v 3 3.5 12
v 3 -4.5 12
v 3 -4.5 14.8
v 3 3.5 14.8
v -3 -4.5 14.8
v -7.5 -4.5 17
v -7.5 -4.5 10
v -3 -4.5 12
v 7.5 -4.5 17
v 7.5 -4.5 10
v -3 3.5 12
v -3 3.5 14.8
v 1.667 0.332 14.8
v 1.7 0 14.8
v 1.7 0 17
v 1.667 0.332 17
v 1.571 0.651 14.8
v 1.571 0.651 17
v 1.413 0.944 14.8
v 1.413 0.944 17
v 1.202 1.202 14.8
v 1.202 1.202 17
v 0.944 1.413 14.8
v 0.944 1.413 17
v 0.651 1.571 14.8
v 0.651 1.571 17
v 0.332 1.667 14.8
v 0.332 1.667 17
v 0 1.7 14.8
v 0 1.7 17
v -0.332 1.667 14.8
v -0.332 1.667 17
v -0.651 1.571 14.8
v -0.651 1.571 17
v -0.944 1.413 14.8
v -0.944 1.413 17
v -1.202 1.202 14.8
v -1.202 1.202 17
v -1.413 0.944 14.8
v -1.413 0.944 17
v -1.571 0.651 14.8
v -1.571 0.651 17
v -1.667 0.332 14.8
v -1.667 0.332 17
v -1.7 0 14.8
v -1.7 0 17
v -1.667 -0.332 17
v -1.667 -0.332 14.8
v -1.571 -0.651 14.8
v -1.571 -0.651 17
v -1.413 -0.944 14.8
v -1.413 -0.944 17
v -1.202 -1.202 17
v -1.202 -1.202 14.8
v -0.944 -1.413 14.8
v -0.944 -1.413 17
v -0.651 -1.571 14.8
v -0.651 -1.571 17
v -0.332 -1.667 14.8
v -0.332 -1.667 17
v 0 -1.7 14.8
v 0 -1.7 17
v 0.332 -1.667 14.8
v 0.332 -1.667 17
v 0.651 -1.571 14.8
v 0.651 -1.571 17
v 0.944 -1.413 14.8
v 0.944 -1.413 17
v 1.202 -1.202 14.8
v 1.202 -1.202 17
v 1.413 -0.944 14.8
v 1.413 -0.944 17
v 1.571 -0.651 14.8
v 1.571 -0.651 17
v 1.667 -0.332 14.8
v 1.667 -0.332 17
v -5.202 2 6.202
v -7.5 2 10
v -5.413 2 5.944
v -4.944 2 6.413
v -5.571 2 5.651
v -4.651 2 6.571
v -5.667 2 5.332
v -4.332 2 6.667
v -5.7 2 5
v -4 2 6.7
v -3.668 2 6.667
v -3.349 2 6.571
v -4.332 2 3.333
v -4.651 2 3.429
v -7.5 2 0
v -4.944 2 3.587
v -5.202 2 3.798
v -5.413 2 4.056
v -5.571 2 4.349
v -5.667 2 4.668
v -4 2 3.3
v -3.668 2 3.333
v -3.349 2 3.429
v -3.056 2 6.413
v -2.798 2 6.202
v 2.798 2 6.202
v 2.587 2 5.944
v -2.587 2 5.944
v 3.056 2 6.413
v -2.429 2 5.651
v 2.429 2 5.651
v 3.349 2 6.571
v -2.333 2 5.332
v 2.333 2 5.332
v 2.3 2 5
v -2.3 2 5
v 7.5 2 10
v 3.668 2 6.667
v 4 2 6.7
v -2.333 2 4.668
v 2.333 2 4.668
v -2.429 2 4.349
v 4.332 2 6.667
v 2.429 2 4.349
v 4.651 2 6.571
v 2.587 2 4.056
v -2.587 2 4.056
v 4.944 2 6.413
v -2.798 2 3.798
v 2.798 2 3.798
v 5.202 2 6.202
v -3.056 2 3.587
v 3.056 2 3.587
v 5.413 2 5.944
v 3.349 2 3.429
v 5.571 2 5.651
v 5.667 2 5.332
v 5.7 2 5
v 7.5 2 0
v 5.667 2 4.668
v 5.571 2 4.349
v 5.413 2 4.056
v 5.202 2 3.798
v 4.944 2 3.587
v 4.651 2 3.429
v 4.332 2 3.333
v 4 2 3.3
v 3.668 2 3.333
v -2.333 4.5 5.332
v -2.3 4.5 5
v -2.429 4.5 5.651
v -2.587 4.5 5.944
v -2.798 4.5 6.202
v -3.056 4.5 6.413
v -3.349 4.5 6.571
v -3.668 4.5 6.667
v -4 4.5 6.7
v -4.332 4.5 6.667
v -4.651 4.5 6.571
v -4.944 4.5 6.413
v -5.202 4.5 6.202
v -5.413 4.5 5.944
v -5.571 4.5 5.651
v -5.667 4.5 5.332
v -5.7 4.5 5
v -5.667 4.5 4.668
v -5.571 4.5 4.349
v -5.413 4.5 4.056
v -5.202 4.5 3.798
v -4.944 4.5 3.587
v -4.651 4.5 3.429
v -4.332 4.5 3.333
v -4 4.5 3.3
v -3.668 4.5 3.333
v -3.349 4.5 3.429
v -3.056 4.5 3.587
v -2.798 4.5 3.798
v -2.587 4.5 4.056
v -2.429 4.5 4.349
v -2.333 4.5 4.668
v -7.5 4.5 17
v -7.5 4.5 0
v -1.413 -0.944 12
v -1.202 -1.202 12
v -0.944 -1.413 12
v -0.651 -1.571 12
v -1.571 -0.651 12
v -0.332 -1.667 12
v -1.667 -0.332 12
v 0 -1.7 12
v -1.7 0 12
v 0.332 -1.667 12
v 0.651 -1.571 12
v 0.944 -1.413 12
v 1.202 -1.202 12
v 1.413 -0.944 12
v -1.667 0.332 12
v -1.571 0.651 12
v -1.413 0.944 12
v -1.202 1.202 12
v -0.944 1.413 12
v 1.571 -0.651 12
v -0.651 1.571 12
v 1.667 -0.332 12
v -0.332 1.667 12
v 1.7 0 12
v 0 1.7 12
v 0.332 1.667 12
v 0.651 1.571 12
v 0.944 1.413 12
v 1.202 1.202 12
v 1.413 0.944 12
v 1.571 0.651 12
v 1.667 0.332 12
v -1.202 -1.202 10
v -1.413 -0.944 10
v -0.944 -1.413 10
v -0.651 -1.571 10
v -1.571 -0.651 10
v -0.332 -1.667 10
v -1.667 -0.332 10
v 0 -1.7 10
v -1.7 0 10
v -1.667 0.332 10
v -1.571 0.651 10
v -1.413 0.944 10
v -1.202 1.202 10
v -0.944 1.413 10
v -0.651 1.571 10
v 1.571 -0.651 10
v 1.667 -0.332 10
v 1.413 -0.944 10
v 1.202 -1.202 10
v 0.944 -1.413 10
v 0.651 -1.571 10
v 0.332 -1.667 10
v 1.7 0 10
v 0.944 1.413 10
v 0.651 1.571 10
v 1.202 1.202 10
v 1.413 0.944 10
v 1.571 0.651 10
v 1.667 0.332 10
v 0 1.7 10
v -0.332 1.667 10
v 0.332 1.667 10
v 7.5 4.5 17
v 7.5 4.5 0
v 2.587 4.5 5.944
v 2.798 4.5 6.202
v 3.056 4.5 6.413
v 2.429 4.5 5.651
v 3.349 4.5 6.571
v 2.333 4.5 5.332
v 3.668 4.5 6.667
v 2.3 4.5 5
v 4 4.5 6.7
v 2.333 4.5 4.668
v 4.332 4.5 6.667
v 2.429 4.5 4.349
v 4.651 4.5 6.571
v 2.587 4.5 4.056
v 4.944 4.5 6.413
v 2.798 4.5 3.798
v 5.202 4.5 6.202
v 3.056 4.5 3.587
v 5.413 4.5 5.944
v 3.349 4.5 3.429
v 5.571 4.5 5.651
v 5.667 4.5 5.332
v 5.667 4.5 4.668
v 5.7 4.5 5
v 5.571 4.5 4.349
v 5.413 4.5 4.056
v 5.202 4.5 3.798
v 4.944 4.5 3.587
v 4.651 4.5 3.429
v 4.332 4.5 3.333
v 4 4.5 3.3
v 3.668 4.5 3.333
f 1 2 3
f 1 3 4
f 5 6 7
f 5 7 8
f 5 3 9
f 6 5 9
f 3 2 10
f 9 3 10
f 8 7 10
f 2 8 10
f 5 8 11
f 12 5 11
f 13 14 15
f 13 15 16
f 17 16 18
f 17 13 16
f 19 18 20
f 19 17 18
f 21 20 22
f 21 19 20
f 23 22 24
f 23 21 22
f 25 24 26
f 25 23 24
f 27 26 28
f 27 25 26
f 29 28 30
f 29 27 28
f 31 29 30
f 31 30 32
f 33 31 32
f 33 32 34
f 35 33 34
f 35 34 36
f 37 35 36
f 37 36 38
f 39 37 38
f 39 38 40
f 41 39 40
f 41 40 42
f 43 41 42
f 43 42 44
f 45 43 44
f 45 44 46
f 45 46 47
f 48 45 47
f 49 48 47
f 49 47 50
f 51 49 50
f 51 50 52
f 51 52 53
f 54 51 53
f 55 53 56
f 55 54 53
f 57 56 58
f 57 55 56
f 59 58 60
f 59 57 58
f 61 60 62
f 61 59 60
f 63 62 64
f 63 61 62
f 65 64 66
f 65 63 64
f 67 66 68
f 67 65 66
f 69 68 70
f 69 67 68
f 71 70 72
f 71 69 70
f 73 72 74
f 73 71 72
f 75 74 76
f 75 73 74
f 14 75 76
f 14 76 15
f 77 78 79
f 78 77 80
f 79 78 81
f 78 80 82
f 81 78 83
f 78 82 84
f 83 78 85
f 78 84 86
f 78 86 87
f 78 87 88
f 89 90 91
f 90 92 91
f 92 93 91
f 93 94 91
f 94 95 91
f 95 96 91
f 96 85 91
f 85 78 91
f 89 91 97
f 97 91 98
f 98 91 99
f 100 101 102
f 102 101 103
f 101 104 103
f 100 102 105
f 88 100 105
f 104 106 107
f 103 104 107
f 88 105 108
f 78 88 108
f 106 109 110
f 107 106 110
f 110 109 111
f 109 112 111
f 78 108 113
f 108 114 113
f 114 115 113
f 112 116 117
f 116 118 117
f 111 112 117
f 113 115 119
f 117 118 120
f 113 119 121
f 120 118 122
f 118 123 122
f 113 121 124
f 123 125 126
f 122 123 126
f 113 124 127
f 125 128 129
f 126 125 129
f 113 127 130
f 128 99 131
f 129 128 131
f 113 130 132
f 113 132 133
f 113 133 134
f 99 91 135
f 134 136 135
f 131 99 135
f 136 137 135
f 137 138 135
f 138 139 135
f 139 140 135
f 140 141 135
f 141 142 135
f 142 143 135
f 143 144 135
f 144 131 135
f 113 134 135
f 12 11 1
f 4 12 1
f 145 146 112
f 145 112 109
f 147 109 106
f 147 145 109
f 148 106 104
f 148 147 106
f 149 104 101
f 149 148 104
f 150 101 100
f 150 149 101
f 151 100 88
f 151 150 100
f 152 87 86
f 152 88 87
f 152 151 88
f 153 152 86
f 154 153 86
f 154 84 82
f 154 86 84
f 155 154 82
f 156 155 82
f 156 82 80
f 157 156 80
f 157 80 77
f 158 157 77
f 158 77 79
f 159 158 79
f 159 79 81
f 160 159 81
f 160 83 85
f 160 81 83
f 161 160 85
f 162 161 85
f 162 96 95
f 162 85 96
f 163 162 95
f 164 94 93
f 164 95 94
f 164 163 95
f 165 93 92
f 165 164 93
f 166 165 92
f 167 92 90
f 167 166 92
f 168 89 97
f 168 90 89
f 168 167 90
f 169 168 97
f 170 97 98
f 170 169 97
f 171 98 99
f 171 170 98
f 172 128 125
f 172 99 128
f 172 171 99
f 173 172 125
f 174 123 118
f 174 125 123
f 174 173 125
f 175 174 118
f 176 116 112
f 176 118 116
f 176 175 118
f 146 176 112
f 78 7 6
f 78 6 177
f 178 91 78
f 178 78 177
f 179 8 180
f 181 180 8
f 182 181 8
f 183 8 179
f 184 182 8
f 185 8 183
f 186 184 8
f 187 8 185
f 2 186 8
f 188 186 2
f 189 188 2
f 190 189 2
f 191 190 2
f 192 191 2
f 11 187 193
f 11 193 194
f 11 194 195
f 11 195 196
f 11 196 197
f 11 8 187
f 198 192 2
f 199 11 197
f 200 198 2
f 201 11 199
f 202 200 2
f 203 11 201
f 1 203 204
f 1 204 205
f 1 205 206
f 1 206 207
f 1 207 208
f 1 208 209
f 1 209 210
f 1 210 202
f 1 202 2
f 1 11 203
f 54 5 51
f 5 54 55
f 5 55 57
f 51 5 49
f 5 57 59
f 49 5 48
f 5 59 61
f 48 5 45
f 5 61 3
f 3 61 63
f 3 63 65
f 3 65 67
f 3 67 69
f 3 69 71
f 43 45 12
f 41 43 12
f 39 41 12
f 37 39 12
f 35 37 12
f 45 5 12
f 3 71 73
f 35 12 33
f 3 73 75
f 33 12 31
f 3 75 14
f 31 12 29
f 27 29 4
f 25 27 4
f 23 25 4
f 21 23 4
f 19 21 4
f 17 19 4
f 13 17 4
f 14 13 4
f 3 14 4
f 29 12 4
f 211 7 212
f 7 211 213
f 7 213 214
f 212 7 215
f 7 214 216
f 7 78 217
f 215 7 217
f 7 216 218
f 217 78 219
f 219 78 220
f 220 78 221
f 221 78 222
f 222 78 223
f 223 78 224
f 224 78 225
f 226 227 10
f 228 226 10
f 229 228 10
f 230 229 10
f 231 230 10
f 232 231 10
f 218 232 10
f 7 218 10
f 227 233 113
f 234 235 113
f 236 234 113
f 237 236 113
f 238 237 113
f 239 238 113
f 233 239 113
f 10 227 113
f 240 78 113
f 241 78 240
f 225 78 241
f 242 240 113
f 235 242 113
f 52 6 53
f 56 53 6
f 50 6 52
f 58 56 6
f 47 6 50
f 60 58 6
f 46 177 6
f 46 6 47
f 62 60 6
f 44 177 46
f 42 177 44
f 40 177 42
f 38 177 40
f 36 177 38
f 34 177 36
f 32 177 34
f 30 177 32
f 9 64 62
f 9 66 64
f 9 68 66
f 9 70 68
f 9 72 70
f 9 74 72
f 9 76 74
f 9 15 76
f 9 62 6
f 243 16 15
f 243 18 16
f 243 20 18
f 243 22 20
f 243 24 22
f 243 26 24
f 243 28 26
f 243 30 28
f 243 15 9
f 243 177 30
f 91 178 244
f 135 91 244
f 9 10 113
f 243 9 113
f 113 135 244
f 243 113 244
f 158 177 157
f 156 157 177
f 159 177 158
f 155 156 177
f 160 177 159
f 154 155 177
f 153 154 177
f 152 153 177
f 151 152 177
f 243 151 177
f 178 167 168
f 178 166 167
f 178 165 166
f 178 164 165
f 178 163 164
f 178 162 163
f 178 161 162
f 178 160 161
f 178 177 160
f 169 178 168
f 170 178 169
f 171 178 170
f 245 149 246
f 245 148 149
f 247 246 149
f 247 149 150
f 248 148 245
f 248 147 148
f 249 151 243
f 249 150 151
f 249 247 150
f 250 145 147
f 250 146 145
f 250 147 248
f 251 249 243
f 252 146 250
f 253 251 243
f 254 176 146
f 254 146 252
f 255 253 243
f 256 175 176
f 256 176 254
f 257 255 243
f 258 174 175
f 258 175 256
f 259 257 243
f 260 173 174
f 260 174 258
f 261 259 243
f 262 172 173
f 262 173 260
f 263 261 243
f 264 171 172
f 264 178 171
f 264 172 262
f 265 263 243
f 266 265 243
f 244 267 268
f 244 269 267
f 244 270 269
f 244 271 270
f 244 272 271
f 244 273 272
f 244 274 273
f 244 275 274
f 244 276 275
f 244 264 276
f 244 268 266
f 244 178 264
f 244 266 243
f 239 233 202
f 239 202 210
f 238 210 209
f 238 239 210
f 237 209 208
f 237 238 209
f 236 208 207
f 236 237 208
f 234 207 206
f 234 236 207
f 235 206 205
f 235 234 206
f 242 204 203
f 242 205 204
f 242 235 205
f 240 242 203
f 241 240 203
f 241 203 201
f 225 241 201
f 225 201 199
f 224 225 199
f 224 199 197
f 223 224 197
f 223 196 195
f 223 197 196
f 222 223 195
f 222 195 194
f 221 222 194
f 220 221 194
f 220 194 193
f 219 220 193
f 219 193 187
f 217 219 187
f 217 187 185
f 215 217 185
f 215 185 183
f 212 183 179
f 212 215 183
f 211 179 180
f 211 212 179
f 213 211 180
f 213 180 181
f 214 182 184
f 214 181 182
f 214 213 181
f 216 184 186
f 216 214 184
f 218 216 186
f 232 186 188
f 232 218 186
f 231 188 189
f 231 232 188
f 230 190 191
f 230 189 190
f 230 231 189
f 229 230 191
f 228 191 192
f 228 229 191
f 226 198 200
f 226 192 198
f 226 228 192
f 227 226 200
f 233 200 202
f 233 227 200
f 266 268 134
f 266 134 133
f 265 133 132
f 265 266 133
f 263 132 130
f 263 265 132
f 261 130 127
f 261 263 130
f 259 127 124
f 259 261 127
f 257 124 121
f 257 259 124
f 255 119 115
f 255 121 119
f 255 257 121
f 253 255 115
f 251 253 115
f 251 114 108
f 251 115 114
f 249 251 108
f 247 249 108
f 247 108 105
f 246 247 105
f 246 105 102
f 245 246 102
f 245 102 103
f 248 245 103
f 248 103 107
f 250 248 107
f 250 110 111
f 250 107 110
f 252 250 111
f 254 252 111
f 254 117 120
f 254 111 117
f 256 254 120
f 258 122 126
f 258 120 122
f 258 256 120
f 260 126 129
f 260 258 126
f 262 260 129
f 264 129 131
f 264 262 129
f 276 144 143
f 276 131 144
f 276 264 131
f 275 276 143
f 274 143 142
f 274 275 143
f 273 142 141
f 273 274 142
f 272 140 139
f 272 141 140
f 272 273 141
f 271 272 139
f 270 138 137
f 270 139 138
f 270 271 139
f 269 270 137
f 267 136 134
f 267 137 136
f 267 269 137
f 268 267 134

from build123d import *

# Parameters (mm, degrees)
SKETCH050_W       = 15
SKETCH050_H       = 9
SKETCH050_R       = 1.7
PAD025_DEPTH      = 17
BOX002_W          = 6
BOX002_H          = 10
BOX002_DEPTH      = 2.8
BOX003_W          = 17
BOX003_H          = 10
BOX003_DEPTH      = 12
CYLINDER002_R     = 1.7
CYLINDER002_DEPTH = 10
CYLINDER003_R     = 1.7
CYLINDER003_DEPTH = 10


with BuildPart() as part:
    # Sketch050 → Pad025 (new body)
    with BuildSketch(Plane.XY):
        Rectangle(SKETCH050_W, SKETCH050_H)
        Circle(SKETCH050_R, mode=Mode.SUBTRACT)
    extrude(amount=PAD025_DEPTH)

    # Box002 → Box002 (cut)
    with BuildSketch(Plane(origin=(-3, -6.5, 12), x_dir=(1, 0, 0), z_dir=(0, 0, 1))):
        with Locations((3, 5)):
            Rectangle(BOX002_W, BOX002_H)
    extrude(amount=BOX002_DEPTH, mode=Mode.SUBTRACT)

    # Box003 → Box003 (cut)
    with BuildSketch(Plane(origin=(-8, -8, -2), x_dir=(1, 0, 0), z_dir=(0, 0, 1))):
        with Locations((8.5, 5)):
            Rectangle(BOX003_W, BOX003_H)
    extrude(amount=BOX003_DEPTH, mode=Mode.SUBTRACT)

    # Cylinder002 → Cylinder002 (cut)
    with BuildSketch(Plane(origin=(-4, 7, 5), x_dir=(1, 0, 0), z_dir=(0, -1, 0))):
        Circle(CYLINDER002_R)
    extrude(amount=CYLINDER002_DEPTH, mode=Mode.SUBTRACT)

    # Cylinder003 → Cylinder003 (cut)
    with BuildSketch(Plane(origin=(4, 7, 5), x_dir=(1, 0, 0), z_dir=(0, -1, 0))):
        Circle(CYLINDER003_R)
    extrude(amount=CYLINDER003_DEPTH, mode=Mode.SUBTRACT)


solid = part.part
